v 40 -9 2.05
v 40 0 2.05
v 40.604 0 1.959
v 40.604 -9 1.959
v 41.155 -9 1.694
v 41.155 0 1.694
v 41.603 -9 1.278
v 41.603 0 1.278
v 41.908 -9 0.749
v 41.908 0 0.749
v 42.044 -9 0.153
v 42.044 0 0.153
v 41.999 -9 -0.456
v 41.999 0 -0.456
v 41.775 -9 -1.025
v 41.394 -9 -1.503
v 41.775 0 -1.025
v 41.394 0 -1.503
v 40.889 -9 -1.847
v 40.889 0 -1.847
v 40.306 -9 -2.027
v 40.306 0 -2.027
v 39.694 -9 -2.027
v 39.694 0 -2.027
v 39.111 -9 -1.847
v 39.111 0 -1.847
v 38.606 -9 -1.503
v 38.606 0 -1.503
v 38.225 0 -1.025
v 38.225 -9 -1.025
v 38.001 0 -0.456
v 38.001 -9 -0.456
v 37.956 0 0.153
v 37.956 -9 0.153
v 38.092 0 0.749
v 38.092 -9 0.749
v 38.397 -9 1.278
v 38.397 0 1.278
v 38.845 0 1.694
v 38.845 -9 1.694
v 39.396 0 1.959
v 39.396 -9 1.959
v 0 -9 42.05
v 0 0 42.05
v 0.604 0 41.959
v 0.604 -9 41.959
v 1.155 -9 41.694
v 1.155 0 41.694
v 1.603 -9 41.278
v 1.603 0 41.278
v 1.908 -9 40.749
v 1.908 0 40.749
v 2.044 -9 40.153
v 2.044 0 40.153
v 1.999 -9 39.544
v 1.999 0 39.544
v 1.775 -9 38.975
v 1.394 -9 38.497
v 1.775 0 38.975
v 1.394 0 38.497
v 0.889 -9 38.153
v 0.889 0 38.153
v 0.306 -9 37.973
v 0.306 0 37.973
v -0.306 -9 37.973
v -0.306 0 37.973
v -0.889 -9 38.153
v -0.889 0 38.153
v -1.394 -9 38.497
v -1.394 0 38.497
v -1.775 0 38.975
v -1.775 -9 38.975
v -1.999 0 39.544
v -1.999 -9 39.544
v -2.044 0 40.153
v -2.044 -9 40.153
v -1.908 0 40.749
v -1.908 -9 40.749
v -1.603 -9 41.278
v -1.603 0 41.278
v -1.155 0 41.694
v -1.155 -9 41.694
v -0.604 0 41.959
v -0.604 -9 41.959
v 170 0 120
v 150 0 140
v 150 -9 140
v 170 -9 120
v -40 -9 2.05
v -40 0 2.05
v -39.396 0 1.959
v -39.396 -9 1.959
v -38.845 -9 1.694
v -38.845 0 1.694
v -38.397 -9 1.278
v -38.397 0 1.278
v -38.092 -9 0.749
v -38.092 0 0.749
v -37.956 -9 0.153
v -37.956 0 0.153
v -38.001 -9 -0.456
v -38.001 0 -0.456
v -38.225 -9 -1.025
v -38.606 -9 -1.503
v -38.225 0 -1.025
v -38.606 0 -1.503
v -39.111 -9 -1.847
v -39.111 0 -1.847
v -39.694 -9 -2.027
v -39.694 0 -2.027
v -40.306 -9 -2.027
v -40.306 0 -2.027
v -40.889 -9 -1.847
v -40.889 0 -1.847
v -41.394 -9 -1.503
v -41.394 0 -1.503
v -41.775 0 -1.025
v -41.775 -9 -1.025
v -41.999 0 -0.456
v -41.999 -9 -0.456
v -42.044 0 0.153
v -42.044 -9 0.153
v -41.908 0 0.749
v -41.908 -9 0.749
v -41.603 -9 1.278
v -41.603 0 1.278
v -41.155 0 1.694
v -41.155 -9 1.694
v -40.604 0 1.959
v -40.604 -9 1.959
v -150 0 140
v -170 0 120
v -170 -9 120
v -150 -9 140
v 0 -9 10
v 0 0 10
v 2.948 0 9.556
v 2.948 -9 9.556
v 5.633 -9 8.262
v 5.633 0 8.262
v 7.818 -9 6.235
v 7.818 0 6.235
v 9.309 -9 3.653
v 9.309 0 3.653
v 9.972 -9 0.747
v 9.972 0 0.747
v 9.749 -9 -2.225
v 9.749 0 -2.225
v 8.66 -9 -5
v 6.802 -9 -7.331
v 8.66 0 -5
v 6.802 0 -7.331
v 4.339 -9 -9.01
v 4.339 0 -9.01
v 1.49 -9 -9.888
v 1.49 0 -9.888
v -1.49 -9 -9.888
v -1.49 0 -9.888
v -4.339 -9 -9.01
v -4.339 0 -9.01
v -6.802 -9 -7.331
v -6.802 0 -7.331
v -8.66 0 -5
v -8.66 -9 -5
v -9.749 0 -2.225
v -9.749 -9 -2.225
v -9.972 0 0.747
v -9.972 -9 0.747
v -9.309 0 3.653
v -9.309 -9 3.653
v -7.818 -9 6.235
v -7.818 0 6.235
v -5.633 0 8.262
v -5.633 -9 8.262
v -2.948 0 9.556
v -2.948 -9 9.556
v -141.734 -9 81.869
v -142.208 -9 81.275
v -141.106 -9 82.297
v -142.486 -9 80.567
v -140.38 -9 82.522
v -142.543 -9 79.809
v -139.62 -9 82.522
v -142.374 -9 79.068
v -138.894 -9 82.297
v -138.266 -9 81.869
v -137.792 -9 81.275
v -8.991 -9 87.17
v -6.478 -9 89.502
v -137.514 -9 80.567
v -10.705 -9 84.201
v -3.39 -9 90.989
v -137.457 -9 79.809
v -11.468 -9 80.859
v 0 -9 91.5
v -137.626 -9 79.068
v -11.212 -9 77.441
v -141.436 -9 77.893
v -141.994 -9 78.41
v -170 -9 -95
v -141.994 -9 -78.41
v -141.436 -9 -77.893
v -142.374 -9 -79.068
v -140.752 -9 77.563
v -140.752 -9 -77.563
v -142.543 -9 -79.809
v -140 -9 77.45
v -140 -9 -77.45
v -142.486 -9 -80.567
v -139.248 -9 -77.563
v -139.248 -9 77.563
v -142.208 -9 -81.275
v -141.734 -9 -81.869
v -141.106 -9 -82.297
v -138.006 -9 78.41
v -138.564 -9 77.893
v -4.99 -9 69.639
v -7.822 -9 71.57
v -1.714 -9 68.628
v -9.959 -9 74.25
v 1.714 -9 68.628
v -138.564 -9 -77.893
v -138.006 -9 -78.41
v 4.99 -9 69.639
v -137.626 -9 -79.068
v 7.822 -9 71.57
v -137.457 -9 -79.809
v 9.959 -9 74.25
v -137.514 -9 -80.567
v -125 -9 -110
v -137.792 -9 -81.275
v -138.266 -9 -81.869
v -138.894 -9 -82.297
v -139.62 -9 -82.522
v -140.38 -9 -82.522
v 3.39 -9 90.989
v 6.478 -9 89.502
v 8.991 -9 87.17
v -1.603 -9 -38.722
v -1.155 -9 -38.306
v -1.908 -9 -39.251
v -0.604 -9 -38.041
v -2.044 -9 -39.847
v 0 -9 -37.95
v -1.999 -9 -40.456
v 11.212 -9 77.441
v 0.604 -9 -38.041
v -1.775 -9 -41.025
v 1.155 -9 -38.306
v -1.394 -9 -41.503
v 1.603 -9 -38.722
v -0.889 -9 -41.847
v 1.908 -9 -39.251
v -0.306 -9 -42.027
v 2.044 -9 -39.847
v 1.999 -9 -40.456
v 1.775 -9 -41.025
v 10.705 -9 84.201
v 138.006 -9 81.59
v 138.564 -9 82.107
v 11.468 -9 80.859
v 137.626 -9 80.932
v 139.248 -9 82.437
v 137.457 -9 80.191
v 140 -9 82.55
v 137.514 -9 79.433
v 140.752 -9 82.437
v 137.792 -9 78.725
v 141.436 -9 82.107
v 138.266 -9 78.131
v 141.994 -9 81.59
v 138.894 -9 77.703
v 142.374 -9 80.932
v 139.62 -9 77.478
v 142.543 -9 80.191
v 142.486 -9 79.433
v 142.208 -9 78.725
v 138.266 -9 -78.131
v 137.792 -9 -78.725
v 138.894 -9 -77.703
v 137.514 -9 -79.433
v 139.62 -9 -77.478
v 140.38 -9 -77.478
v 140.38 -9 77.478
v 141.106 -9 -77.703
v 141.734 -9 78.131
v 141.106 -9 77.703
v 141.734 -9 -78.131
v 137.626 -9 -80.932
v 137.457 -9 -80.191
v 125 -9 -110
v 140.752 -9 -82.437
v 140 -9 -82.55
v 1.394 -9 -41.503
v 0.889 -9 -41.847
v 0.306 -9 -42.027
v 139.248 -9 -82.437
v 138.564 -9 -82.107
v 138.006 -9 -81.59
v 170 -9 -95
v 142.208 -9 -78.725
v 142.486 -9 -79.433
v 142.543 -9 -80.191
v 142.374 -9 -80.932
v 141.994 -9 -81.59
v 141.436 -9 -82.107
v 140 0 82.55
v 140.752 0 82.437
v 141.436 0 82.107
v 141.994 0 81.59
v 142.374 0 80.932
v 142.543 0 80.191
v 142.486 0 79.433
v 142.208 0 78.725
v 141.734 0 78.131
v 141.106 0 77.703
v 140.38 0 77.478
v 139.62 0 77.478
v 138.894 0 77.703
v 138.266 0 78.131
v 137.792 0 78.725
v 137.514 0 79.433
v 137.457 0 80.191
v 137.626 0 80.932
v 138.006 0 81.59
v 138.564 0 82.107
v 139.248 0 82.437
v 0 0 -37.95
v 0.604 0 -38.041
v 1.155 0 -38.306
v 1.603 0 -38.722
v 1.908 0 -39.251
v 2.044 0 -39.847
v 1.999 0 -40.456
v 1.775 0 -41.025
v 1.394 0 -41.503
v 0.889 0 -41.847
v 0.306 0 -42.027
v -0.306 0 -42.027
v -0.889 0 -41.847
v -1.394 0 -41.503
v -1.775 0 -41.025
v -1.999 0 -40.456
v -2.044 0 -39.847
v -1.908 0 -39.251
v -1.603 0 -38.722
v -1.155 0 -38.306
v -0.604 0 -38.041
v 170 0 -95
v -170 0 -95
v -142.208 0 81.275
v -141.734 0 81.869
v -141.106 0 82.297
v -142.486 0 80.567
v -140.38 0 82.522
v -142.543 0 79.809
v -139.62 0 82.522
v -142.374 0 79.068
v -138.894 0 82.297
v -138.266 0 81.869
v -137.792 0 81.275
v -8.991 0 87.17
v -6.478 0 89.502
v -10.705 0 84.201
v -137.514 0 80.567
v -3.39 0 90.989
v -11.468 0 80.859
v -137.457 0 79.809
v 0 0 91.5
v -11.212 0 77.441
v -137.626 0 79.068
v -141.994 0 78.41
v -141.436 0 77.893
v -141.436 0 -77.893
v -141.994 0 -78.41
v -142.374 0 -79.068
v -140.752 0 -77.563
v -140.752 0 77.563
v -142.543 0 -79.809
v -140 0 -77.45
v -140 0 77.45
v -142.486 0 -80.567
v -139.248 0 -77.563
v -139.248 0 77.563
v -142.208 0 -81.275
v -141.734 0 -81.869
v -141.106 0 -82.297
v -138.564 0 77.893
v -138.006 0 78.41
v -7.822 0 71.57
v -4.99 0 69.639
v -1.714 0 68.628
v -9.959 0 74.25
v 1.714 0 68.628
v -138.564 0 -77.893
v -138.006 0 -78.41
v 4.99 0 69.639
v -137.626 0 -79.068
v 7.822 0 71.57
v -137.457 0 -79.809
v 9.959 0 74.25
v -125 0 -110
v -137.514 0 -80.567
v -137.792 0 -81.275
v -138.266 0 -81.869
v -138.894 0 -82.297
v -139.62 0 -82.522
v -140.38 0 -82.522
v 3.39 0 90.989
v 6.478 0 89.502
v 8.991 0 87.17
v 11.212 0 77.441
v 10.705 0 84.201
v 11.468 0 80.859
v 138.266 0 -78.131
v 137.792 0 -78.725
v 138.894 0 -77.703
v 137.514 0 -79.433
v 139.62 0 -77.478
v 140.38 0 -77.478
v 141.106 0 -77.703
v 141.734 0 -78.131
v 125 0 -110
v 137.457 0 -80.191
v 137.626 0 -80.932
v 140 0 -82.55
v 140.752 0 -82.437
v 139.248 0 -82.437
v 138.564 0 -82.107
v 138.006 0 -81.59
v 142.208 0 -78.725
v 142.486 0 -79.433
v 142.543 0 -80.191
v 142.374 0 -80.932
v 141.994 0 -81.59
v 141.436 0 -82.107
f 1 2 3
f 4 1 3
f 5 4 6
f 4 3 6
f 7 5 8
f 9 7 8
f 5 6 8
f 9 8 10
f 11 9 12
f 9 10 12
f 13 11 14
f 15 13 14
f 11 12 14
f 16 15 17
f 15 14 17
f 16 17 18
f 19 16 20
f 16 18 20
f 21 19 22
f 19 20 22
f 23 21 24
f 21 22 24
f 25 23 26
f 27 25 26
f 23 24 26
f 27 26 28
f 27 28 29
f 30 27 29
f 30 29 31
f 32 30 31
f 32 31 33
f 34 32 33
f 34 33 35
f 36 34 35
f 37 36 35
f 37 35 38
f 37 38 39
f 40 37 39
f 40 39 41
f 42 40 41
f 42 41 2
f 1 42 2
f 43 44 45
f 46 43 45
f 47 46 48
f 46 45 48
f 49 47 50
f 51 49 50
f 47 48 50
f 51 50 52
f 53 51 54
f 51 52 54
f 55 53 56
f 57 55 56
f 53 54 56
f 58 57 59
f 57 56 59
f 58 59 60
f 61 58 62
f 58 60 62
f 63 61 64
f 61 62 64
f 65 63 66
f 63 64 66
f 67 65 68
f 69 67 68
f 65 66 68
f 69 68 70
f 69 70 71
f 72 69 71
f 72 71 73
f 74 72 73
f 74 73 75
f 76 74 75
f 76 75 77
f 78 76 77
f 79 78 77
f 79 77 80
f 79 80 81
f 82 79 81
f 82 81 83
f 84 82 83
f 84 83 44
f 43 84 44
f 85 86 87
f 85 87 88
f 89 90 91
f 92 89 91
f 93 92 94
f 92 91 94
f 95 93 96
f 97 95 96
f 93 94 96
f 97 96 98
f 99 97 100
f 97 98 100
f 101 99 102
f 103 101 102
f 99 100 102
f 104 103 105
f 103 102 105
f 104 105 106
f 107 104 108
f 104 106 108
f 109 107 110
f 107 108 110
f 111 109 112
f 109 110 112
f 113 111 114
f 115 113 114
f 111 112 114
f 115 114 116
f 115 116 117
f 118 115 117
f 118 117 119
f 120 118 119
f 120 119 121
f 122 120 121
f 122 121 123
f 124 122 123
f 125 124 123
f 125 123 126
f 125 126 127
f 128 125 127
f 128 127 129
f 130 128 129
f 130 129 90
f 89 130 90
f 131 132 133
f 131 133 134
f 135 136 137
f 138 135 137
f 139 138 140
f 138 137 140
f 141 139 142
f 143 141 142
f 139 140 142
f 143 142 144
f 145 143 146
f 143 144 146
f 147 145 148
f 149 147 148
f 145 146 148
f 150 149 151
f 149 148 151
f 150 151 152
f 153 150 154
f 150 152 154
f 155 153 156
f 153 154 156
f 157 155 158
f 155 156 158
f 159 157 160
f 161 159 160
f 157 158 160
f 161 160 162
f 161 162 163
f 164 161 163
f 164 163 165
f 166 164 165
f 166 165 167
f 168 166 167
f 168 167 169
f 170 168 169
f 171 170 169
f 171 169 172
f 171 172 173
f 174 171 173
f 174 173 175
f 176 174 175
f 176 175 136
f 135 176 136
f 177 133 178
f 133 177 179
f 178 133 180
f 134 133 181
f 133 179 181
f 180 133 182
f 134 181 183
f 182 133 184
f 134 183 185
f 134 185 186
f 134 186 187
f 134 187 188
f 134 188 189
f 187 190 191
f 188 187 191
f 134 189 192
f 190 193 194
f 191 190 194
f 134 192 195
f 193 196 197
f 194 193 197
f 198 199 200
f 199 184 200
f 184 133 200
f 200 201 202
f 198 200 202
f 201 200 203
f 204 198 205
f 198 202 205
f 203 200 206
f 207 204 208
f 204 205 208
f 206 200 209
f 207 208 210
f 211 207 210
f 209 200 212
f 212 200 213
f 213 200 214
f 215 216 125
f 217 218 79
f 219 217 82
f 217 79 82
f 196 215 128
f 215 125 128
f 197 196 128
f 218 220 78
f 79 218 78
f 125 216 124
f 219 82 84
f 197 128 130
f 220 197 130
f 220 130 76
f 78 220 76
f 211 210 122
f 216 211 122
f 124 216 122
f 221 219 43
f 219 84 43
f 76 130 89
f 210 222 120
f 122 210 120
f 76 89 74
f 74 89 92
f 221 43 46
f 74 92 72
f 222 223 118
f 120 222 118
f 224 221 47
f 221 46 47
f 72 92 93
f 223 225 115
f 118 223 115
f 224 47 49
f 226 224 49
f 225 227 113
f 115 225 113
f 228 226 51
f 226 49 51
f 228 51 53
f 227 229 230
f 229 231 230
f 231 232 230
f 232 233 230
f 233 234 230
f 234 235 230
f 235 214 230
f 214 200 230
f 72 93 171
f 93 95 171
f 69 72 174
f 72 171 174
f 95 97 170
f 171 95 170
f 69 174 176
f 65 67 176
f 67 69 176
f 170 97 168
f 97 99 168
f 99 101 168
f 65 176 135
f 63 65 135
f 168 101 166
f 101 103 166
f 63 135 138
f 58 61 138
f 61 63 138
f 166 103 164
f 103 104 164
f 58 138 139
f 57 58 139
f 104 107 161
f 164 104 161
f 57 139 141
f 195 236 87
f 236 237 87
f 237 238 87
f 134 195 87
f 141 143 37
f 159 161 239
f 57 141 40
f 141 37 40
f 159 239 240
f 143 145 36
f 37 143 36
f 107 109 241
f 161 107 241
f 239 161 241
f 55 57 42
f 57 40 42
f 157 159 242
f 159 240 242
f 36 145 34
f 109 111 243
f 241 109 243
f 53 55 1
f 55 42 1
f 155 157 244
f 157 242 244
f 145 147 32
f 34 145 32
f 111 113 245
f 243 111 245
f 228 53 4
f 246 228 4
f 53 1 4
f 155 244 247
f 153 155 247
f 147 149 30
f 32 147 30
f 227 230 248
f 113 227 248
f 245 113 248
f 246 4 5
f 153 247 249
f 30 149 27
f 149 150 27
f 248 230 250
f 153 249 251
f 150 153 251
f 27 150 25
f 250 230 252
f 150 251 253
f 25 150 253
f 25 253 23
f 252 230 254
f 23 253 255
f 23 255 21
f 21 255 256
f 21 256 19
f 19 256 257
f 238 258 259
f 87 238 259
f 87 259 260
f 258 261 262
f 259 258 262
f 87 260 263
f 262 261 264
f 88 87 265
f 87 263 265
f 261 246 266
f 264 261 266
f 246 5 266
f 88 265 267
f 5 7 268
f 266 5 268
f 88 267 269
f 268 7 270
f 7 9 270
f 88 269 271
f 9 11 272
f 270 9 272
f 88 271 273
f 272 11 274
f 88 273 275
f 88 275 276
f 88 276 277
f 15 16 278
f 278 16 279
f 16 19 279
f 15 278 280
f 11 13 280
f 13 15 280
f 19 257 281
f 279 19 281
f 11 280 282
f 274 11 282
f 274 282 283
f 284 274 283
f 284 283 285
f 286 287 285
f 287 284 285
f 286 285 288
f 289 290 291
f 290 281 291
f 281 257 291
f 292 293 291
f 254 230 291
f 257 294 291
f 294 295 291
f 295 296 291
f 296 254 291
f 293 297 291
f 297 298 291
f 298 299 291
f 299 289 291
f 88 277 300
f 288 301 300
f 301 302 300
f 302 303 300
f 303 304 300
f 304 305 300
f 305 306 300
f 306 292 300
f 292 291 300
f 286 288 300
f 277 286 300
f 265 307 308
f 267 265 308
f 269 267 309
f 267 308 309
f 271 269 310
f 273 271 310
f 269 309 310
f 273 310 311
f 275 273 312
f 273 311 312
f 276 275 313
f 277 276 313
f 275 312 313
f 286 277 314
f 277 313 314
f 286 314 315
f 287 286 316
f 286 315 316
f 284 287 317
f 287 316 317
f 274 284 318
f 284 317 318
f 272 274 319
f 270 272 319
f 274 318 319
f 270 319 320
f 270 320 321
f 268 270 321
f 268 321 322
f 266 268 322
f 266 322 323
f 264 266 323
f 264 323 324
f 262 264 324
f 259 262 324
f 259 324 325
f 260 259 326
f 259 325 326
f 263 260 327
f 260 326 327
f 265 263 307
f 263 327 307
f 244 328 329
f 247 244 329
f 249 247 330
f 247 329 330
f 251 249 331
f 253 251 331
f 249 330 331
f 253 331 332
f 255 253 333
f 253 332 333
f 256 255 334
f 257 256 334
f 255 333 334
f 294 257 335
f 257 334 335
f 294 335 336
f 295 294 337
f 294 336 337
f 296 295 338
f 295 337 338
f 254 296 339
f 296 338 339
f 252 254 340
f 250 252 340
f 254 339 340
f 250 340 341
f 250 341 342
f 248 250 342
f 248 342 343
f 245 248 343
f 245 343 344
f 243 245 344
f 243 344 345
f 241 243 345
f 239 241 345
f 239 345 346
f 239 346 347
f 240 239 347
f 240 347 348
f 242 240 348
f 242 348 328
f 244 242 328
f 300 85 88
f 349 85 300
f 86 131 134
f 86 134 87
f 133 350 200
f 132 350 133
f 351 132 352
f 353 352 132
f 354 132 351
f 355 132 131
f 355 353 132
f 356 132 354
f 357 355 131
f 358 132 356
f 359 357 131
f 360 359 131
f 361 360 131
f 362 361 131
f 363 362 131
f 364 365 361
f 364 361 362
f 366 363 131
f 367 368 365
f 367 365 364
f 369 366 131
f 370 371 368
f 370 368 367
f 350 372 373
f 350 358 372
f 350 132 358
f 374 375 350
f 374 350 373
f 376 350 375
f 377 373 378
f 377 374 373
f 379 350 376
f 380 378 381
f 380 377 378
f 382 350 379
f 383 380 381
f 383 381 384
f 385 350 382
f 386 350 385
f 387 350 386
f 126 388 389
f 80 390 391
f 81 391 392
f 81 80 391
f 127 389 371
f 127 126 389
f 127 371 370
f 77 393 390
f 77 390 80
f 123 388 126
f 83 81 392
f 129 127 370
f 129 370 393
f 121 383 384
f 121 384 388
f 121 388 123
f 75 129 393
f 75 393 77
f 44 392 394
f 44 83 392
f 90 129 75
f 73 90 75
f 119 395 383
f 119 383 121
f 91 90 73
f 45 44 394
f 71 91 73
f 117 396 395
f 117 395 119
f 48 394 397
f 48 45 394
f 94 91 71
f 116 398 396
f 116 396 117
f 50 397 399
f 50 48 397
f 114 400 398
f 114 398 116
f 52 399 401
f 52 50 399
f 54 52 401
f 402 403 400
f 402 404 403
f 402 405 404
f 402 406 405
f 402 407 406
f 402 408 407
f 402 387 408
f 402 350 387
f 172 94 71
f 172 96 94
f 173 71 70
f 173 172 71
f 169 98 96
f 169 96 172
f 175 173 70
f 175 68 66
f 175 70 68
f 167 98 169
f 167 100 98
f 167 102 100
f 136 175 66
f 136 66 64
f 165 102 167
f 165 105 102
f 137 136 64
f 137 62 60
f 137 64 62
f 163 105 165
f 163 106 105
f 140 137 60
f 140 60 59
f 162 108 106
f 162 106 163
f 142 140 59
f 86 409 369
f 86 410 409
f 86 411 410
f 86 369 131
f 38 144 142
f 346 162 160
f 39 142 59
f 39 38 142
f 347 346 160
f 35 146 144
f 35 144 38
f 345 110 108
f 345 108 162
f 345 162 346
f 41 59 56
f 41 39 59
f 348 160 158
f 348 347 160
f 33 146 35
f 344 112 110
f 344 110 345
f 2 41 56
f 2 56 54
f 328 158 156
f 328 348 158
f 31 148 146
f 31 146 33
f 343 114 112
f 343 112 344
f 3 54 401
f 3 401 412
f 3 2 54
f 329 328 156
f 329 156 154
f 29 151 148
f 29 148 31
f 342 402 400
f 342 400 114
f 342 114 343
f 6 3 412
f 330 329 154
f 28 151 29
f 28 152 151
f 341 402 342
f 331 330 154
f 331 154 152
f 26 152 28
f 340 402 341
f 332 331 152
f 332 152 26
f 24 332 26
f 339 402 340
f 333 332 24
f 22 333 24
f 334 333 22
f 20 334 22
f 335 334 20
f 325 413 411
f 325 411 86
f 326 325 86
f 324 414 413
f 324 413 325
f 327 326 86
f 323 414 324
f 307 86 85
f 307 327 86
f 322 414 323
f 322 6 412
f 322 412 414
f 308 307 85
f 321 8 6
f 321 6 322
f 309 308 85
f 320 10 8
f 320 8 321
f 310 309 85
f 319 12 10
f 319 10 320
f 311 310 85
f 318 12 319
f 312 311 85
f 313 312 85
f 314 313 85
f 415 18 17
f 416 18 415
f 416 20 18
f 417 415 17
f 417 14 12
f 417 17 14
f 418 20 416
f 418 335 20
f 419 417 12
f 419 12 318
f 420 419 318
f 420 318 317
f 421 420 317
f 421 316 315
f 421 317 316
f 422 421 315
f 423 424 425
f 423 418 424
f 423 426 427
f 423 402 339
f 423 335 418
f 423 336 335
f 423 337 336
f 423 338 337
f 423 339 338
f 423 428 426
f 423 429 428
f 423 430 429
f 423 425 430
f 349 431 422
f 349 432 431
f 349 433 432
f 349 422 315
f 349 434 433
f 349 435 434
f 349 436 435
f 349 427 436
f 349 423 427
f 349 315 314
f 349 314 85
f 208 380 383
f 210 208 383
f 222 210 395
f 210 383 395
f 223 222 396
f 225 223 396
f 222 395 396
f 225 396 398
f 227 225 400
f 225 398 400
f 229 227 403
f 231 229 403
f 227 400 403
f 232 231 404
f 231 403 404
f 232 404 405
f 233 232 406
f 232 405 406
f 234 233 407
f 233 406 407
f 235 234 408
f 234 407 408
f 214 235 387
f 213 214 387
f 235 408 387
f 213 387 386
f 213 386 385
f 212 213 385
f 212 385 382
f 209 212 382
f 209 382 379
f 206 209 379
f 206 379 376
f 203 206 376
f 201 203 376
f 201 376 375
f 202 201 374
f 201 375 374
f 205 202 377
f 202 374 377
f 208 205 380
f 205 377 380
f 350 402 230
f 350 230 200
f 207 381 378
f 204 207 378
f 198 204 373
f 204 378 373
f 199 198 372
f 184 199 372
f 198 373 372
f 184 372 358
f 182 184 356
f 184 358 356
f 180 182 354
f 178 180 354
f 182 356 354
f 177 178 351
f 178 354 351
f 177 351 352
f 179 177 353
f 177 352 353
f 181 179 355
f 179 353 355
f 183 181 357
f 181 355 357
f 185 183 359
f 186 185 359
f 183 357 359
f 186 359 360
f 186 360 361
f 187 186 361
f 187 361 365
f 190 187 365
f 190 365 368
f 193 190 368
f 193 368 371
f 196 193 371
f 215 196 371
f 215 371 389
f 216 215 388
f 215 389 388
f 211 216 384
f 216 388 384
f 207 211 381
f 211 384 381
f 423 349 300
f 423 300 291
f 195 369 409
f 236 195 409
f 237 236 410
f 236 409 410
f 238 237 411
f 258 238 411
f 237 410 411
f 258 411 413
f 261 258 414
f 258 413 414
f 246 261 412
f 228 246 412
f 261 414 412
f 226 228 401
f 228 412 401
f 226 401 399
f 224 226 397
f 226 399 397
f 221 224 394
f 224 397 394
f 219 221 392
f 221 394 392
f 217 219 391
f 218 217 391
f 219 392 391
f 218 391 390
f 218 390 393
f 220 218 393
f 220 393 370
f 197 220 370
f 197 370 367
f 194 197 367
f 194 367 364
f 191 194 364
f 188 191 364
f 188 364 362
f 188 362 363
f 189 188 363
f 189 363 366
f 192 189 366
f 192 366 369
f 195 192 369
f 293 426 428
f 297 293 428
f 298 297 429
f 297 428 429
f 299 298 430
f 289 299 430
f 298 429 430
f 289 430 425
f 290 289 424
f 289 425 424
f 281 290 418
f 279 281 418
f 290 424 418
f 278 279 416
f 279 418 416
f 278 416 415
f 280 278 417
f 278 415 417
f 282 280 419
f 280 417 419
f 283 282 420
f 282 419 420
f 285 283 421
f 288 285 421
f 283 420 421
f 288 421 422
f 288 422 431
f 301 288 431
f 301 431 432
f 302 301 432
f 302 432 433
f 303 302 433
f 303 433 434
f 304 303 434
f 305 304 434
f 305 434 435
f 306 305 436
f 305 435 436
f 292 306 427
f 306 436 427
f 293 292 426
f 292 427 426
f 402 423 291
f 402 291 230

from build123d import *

# Parameters (mm, degrees)
ESQUISSE3_R             = 2.55
STRUCTURE_DEPTH         = 9
ESQUISSE4_R             = 10
ESQUISSE4_R_2           = 11.5
ESQUISSE4_R_3           = 2.05
ENL_V_MAT_EXTRU_1_DEPTH = 10


with BuildPart() as part:
    # Esquisse3 → structure (new body)
    with BuildSketch(Plane(origin=(0, 0, 0), x_dir=(1, 0, 0), z_dir=(0, 1, 0))):
        Polygon((125, 110), (-125, 110), (-170, 95), (-170, 0), (-170, -120), (-150, -140), (-120, -140), (120, -140), (150, -140), (170, -120), (170, 0), (170, 95), align=None)
        with Locations(Location((-140, 80, 0), (0, 0, 270))):
            Circle(ESQUISSE3_R, mode=Mode.SUBTRACT)
        with Locations(Location((-140, -80, 0), (0, 0, 90))):
            Circle(ESQUISSE3_R, mode=Mode.SUBTRACT)
        with Locations(Location((140, -80, 0), (0, 0, 270))):
            Circle(ESQUISSE3_R, mode=Mode.SUBTRACT)
        with Locations(Location((140, 80, 0), (0, 0, 90))):
            Circle(ESQUISSE3_R, mode=Mode.SUBTRACT)
    extrude(amount=-STRUCTURE_DEPTH)

    # Esquisse4 → Enlèv. mat.-Extru.1 (cut)
    with BuildSketch(Plane(origin=(0, 0, 0), x_dir=(1, 0, 0), z_dir=(0, 1, 0))):
        with Locations(Location((0, 0, 0), (0, 0, 270))):
            Circle(ESQUISSE4_R)
        with Locations(Location((0, -80, 0), (0, 0, 270))):
            Circle(ESQUISSE4_R_2)
        with Locations(Location((0, 40, 0), (0, 0, 270))):
            Circle(ESQUISSE4_R_3)
        with Locations(Location((40, 0, 0), (0, 0, 270))):
            Circle(ESQUISSE4_R_3)
        with Locations(Location((0, -40, 0), (0, 0, 270))):
            Circle(ESQUISSE4_R_3)
        with Locations(Location((-40, 0, 0), (0, 0, 270))):
            Circle(ESQUISSE4_R_3)
    extrude(amount=-ENL_V_MAT_EXTRU_1_DEPTH, mode=Mode.SUBTRACT)


solid = part.part
